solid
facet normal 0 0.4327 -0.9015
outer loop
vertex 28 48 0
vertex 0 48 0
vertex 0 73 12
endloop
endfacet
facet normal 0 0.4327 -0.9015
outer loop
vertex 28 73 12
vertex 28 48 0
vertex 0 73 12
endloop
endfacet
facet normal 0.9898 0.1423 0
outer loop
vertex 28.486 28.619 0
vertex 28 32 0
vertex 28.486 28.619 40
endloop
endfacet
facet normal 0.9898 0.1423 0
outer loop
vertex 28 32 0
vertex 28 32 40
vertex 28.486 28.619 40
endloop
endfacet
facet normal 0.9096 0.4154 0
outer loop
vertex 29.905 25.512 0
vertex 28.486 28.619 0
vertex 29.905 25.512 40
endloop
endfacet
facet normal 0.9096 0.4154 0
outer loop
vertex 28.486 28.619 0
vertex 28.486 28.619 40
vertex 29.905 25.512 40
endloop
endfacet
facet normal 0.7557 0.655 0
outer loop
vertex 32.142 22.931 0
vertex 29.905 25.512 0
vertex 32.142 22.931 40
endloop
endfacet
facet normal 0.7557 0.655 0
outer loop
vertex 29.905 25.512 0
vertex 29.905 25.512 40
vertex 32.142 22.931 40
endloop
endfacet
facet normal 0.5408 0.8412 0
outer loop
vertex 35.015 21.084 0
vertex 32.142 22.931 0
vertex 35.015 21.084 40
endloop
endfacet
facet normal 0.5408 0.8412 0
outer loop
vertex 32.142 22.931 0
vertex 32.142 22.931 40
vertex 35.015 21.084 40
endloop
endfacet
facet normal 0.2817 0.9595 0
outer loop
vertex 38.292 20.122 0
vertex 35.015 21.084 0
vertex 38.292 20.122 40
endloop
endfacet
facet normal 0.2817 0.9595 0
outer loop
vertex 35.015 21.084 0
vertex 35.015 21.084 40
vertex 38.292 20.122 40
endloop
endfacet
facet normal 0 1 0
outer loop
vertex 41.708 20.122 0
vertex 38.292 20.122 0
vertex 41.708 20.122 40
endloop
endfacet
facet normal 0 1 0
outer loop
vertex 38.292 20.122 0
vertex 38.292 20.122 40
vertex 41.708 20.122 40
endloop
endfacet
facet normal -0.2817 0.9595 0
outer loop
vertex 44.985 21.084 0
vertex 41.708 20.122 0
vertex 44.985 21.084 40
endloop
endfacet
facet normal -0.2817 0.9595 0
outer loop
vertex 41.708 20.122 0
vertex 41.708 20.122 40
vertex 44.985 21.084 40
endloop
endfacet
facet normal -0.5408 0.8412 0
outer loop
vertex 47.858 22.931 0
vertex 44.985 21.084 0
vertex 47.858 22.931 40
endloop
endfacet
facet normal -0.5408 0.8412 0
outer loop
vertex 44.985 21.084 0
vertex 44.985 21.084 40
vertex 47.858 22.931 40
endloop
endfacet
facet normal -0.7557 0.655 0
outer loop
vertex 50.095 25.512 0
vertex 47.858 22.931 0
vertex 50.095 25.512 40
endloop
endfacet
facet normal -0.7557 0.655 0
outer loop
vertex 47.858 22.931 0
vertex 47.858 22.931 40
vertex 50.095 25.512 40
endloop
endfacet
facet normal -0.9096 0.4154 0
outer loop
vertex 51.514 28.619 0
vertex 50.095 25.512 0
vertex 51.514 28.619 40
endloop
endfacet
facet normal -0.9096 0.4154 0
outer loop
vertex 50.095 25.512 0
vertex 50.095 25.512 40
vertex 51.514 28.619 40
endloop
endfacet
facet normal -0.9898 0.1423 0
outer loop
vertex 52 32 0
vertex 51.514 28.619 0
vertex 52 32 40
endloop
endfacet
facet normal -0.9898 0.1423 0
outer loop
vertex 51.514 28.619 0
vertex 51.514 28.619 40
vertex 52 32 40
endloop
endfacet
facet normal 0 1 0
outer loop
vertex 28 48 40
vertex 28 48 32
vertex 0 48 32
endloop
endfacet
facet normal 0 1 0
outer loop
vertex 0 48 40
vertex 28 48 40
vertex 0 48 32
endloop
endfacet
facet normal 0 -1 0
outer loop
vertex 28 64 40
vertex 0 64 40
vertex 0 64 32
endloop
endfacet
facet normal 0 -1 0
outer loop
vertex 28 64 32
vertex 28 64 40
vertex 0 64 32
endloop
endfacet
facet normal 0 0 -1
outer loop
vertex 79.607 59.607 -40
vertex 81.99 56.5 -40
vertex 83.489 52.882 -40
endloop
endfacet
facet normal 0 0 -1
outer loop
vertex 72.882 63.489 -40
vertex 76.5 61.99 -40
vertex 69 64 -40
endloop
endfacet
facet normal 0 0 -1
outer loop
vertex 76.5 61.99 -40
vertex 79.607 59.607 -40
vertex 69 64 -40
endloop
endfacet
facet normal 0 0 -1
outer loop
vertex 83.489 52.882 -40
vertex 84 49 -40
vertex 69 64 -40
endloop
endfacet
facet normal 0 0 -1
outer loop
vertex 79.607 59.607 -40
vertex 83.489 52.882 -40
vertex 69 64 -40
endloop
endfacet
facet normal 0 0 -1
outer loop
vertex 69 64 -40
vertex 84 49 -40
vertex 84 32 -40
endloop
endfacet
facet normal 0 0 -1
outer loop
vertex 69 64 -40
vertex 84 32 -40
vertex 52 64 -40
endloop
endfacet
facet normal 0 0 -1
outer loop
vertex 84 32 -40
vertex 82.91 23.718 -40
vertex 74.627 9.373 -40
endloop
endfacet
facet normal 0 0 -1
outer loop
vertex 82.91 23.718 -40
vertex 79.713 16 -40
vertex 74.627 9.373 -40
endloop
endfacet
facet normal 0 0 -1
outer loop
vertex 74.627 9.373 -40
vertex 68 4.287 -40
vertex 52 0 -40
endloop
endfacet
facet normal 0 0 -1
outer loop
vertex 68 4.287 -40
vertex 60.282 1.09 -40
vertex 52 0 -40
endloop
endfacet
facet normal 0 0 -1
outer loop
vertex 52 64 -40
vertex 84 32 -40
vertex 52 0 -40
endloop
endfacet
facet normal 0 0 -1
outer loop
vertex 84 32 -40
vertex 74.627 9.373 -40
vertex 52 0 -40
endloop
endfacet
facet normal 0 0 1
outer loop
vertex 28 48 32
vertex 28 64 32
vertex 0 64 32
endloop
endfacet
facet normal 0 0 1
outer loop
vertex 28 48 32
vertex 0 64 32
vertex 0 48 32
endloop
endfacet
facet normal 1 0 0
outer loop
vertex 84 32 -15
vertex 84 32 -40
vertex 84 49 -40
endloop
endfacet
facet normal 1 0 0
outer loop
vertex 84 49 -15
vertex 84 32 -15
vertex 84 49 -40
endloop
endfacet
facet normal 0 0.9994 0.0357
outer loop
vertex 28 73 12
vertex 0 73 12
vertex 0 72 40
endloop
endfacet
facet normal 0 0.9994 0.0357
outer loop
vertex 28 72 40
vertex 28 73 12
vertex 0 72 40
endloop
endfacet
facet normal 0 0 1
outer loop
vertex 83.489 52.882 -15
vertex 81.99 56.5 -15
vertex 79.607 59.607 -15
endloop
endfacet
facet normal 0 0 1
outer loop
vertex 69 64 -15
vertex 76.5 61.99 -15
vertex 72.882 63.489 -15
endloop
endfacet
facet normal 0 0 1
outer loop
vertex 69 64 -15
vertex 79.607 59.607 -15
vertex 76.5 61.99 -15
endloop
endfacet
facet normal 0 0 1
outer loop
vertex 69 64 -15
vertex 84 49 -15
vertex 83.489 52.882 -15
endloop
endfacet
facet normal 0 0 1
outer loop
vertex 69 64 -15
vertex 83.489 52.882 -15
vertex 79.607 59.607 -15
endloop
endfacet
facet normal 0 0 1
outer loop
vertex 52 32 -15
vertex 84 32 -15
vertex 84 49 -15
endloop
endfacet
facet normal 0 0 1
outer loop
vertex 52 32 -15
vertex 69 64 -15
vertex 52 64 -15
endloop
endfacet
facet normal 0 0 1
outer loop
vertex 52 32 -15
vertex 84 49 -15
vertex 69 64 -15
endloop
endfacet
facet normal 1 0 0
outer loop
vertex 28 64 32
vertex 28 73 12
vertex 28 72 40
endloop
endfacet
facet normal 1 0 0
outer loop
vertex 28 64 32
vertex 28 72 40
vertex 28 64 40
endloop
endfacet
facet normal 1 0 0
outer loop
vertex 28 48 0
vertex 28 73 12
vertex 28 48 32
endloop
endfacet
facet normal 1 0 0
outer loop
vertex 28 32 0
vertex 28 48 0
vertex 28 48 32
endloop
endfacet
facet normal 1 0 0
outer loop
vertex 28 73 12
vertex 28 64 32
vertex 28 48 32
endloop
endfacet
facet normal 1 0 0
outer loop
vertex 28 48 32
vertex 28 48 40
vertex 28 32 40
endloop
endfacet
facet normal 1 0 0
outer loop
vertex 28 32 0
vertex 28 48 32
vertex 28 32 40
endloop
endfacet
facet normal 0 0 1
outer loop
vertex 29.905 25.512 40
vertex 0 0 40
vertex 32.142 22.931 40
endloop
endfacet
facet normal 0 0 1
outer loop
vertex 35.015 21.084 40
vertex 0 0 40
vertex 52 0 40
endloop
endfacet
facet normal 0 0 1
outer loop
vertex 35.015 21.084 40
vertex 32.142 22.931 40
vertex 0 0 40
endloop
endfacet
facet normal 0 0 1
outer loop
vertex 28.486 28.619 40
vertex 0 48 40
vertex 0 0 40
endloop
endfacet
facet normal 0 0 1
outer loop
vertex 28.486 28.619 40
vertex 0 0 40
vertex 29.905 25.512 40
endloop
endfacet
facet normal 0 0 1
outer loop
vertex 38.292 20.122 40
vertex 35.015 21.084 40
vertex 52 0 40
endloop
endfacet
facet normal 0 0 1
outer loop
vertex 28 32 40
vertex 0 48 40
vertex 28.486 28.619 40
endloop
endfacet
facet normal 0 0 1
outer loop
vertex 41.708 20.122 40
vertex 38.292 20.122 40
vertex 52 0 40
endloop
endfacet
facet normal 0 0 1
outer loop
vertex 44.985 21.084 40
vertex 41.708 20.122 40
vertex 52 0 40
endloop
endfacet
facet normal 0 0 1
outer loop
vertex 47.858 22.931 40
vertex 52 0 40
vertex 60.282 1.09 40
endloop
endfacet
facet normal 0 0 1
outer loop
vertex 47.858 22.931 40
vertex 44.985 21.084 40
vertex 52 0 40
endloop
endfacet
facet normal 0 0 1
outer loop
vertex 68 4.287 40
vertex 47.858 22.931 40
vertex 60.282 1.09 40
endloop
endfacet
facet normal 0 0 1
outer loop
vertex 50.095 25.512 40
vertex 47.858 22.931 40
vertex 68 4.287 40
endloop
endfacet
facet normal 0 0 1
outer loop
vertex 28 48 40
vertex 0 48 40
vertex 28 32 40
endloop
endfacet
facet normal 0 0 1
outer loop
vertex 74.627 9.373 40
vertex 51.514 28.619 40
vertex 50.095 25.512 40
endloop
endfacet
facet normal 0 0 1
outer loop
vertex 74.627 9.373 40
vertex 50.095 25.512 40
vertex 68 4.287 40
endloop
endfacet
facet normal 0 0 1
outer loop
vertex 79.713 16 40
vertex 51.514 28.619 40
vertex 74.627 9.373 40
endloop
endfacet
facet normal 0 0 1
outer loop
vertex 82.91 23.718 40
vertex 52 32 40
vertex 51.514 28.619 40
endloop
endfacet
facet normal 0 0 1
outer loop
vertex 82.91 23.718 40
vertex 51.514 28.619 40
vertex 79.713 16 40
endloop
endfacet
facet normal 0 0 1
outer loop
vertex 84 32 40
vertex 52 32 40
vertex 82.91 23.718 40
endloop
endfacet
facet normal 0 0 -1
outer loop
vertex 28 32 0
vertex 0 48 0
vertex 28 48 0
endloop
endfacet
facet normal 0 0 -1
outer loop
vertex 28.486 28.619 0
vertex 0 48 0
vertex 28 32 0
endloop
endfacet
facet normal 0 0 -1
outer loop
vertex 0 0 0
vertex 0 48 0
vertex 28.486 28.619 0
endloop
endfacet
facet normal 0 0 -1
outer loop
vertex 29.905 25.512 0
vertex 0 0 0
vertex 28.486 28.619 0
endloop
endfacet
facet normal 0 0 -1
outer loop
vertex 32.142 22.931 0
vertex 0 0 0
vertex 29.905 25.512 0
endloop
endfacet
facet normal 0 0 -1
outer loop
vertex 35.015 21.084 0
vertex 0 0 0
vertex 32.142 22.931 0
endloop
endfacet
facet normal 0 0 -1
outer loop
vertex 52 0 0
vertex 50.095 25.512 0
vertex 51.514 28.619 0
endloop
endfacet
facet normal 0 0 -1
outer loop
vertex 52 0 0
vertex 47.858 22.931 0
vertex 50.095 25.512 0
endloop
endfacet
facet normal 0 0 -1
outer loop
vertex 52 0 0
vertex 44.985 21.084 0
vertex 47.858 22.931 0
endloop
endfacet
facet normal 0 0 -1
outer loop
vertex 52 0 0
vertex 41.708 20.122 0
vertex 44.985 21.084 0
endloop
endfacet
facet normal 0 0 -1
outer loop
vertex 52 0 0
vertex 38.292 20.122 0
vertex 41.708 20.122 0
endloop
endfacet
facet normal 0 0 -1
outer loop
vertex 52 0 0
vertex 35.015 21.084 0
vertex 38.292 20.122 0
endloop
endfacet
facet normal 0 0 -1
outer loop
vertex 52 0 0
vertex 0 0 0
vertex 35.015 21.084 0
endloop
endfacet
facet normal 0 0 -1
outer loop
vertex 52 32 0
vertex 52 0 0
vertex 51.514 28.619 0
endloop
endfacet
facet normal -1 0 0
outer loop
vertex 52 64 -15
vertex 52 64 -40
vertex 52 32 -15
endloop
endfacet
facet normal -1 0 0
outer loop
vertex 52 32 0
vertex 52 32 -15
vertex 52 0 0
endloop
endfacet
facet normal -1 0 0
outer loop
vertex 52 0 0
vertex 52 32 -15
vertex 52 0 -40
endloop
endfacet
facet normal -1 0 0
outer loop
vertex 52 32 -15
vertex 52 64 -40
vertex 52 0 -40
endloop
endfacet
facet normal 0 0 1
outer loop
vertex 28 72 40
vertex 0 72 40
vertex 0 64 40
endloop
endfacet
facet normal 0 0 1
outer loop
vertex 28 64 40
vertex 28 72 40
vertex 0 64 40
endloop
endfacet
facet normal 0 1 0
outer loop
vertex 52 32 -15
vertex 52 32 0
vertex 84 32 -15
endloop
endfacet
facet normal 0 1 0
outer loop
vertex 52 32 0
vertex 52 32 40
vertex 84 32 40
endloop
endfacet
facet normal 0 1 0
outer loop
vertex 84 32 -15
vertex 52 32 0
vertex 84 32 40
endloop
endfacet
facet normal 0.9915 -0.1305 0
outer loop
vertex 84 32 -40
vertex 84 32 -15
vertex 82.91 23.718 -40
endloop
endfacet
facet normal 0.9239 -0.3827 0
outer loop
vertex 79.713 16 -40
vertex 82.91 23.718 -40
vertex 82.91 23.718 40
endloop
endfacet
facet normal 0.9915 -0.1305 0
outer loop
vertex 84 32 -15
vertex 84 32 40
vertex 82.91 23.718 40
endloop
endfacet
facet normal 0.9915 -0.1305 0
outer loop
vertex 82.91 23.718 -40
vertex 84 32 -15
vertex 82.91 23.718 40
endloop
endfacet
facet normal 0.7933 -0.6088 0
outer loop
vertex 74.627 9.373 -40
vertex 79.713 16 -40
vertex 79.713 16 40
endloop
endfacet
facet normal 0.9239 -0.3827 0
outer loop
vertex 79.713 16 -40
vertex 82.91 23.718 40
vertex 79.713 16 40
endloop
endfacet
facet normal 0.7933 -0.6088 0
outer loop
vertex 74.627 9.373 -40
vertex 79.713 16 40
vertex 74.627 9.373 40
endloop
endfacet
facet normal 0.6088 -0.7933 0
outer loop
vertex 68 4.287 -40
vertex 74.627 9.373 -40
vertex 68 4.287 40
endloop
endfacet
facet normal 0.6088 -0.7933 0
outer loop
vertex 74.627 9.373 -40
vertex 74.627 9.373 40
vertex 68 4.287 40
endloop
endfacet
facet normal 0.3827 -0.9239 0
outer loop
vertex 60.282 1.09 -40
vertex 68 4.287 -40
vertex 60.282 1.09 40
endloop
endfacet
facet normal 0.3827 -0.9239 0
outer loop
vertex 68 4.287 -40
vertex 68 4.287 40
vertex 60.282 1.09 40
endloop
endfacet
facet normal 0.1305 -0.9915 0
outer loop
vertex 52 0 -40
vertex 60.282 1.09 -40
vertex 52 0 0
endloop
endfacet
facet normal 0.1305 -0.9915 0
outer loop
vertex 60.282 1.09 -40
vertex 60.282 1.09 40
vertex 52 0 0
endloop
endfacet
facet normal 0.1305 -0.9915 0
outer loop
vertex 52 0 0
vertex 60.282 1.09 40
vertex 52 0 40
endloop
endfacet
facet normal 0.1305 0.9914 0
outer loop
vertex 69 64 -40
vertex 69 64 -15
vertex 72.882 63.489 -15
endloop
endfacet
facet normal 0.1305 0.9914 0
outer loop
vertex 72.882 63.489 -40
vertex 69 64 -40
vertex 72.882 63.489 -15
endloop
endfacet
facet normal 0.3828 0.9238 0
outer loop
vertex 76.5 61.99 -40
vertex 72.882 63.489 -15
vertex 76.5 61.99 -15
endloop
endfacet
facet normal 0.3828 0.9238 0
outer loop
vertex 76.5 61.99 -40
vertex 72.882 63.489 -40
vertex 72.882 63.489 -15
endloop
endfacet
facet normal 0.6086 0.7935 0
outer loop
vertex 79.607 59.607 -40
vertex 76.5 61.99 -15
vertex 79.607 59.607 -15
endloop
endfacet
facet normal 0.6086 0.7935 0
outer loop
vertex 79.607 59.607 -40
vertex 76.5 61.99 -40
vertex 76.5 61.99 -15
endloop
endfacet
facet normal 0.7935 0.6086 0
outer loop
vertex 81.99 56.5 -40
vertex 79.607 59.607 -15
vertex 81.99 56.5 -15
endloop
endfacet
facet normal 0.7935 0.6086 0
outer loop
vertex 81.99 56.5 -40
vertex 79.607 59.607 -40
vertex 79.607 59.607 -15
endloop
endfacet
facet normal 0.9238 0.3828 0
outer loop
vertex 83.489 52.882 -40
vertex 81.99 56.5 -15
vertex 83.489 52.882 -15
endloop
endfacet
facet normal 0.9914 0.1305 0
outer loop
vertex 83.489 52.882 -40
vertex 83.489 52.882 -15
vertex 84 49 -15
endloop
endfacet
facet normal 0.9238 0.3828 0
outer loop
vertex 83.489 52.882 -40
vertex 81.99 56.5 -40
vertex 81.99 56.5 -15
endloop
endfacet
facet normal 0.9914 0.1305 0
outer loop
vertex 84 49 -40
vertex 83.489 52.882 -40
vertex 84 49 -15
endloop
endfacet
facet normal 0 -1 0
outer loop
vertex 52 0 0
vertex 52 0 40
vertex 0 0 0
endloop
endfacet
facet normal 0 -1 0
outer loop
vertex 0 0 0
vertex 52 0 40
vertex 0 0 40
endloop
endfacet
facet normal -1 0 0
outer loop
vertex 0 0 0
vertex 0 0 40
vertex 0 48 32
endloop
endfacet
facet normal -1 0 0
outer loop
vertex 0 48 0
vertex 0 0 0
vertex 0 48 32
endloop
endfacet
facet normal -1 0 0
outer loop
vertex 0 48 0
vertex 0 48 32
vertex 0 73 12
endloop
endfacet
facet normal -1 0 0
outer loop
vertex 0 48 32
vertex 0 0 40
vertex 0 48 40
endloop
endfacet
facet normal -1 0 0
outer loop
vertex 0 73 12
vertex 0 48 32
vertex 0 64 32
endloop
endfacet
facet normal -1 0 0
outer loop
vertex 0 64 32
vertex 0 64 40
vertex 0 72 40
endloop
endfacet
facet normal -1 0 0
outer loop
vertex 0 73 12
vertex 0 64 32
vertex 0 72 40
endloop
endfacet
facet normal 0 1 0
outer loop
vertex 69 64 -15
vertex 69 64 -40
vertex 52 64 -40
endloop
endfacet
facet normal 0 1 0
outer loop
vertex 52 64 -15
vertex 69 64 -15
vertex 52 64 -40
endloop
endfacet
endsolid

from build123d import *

# Parameters (mm, degrees)
PAD_DEPTH    = 40
PAD003_DEPTH = 28
PAD004_DEPTH = 40
POCKET_DEPTH = 40
PAD005_DEPTH = 25


with BuildPart() as part:
    # Sketch → Pad (new body)
    with BuildSketch(Plane.XY):
        with BuildLine():
            Line((28, 32), (28, 48))
            Line((28, 48), (0, 48))
            Line((0, 48), (0, 0))
            Line((0, 0), (52, 0))
            ThreePointArc((52, 0), (74.627417, 9.372583), (84, 32))
            Line((84, 32), (52, 32))
            ThreePointArc((28, 32), (40, 19.999968), (52, 32))
        make_face()
    extrude(amount=PAD_DEPTH)

    # Sketch003 → Pad003 (join)
    with BuildSketch(Plane(origin=(0, 0, 0), x_dir=(0, -1, 0), z_dir=(-1, 0, 0))):
        Polygon((-48, 0), (-73, 12), (-72, 40), (-64, 40), (-64, 32), (-48, 32), align=None)
    extrude(amount=-PAD003_DEPTH)

    # Pad003 Face5 → Pad004 (add)
    with BuildSketch(Plane(origin=(34.657962, 19.802966, 0), x_dir=(0, -1, 0), z_dir=(0, 0, -1))):
        with BuildLine():
            Line((-28.197034, 6.657962), (-12.197034, 6.657962))
            ThreePointArc((-12.197034, 6.657962), (-0.197002, -5.342038), (-12.197034, -17.342038))
            Line((-12.197034, -17.342038), (-12.197034, -49.342038))
            ThreePointArc((-12.197034, -49.342038), (10.430383, -39.969455), (19.802966, -17.342038))
            Line((19.802966, -17.342038), (19.802966, 34.657962))
            Line((19.802966, 34.657962), (-28.197034, 34.657962))
            Line((-28.197034, 34.657962), (-28.197034, 6.657962))
        make_face()
    extrude(amount=PAD004_DEPTH)

    # Sketch004 (on Face16 of Pad004) → Pocket (cut)
    with BuildSketch(Plane(origin=(0, 0, -40), x_dir=(1, 0, 0), z_dir=(0, 0, -1))):
        with BuildLine():
            Line((52, 0), (0, 0))
            Line((0, 0), (0, -48))
            Line((0, -48), (28, -48))
            Line((28, -48), (28, -31.999968))
            ThreePointArc((52, -32), (40.000016, -19.999968), (28, -31.999968))
            Line((52, -32), (52, 0))
        make_face()
    extrude(amount=-POCKET_DEPTH, mode=Mode.SUBTRACT)

    # Sketch005 (on Face20 of Pocket) → Pad005 (join)
    with BuildSketch(Plane(origin=(0, 0, -40), x_dir=(1, 0, 0), z_dir=(0, 0, -1))):
        with BuildLine():
            Line((52, -32), (84, -32))
            Line((84, -32), (84, -49))
            ThreePointArc((69, -64), (79.606602, -59.606602), (84, -49))
            Line((69, -64), (52, -64))
            Line((52, -64), (52, -32))
        make_face()
    extrude(amount=-PAD005_DEPTH)


solid = part.part
